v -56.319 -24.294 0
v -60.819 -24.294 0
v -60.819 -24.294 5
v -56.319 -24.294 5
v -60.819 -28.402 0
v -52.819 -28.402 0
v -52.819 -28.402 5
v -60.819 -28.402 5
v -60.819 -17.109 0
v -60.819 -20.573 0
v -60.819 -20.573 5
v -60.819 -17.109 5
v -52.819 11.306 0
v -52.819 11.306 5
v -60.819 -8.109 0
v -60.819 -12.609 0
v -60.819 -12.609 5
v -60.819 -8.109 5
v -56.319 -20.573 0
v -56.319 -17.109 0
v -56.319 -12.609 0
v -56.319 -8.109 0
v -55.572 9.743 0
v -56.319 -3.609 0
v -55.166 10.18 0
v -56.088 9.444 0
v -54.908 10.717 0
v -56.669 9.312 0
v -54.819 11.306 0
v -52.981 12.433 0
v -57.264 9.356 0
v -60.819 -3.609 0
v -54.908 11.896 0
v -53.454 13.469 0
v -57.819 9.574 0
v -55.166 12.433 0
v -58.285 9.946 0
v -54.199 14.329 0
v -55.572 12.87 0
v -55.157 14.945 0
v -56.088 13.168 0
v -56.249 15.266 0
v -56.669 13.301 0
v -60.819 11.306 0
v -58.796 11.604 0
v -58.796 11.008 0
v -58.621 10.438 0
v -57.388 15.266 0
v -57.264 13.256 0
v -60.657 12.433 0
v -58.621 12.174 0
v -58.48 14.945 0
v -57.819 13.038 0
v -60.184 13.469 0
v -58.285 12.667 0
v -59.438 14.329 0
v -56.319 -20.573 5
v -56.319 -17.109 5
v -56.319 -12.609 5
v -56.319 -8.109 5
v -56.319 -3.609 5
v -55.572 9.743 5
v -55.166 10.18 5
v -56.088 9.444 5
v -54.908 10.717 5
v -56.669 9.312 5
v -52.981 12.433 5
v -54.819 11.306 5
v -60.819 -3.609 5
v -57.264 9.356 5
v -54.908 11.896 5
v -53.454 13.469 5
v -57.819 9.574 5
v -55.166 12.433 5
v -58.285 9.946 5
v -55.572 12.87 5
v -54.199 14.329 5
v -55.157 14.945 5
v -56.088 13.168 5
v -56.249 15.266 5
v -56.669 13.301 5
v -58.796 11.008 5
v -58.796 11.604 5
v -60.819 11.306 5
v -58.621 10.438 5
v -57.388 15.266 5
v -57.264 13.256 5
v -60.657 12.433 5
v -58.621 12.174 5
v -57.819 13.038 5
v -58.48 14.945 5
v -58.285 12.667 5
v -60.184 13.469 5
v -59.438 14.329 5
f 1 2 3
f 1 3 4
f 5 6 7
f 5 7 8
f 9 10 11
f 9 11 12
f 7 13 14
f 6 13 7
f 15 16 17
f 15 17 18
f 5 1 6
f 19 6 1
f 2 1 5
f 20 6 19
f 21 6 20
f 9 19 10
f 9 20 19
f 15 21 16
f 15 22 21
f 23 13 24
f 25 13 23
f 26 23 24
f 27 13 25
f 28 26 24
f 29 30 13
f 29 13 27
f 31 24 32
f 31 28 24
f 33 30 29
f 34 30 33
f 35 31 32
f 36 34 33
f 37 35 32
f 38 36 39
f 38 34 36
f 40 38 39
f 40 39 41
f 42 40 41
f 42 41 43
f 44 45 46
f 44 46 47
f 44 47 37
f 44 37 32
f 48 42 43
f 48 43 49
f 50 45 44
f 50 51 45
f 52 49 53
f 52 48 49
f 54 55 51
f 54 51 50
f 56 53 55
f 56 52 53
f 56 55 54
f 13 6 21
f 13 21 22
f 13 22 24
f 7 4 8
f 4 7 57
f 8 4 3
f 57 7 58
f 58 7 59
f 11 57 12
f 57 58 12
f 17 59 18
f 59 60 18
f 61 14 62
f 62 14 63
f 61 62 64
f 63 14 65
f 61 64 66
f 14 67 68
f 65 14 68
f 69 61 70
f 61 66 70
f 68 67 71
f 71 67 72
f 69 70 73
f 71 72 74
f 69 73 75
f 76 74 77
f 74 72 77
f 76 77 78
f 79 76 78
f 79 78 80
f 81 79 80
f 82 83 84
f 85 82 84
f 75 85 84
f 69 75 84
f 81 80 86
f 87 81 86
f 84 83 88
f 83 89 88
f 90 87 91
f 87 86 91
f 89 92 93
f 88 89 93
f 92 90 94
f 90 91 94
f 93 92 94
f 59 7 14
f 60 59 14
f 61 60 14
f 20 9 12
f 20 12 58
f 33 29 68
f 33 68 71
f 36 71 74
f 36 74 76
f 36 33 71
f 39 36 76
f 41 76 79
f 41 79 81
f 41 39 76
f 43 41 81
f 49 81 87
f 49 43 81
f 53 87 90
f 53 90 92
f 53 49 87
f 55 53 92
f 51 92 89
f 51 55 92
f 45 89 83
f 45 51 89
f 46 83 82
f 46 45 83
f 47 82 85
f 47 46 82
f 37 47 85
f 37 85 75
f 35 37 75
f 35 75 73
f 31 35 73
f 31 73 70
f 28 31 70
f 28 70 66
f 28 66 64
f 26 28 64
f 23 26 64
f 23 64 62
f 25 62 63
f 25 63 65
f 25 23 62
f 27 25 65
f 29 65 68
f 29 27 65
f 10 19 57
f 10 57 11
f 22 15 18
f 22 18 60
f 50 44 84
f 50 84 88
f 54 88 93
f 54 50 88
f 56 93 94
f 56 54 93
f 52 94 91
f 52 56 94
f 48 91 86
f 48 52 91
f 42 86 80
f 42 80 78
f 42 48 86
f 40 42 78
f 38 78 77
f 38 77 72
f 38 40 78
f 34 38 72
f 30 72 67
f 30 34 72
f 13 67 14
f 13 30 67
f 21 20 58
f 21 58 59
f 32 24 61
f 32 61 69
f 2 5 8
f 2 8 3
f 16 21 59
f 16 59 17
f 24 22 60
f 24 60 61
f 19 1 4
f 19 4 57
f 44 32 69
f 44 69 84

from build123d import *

# Parameters (mm, degrees)
ESQUISSE1_R        = 2
BOSS_EXTRU_1_DEPTH = 5


with BuildPart() as part:
    # Esquisse1 → Boss.-Extru.1 (new body)
    with BuildSketch(Plane.XY):
        with BuildLine():
            Line((-60.818649801, 1.004609912), (-60.818649801, 11.306245912))
            ThreePointArc((-60.818649801, 11.306245912), (-56.818649801, 15.306245912), (-52.818649801, 11.306245912))
            Line((-52.818649801, 11.306245912), (-52.818649801, -28.402433088))
            Line((-52.818649801, -28.402433088), (-60.818649801, -28.402433088))
            Line((-60.818649801, -28.402433088), (-60.818649801, -24.294096088))
            Line((-60.818649801, -24.294096088), (-56.318649801, -24.294096088))
            Line((-56.318649801, -24.294096088), (-56.318649801, -20.573332088))
            Line((-56.318649801, -20.573332088), (-60.818649801, -20.573332088))
            Line((-60.818649801, -20.573332088), (-60.818649801, -17.109221088))
            Line((-60.818649801, -17.109221088), (-56.318649801, -17.109221088))
            Line((-56.318649801, -17.109221088), (-56.318649801, -12.609221088))
            Line((-56.318649801, -12.609221088), (-60.818649801, -12.609221088))
            Line((-60.818649801, -12.609221088), (-60.818649801, -8.109221088))
            Line((-60.818649801, -8.109221088), (-56.318649801, -8.109221088))
            Line((-56.318649801, -8.109221088), (-56.318649801, -3.609221088))
            Line((-56.318649801, -3.609221088), (-60.818649801, -3.609221088))
            Line((-60.818649801, -3.609221088), (-60.818649801, 1.004609912))
        make_face()
        with Locations((-56.818649801, 11.306245912)):
            Circle(ESQUISSE1_R, mode=Mode.SUBTRACT)
    extrude(amount=BOSS_EXTRU_1_DEPTH)


solid = part.part
